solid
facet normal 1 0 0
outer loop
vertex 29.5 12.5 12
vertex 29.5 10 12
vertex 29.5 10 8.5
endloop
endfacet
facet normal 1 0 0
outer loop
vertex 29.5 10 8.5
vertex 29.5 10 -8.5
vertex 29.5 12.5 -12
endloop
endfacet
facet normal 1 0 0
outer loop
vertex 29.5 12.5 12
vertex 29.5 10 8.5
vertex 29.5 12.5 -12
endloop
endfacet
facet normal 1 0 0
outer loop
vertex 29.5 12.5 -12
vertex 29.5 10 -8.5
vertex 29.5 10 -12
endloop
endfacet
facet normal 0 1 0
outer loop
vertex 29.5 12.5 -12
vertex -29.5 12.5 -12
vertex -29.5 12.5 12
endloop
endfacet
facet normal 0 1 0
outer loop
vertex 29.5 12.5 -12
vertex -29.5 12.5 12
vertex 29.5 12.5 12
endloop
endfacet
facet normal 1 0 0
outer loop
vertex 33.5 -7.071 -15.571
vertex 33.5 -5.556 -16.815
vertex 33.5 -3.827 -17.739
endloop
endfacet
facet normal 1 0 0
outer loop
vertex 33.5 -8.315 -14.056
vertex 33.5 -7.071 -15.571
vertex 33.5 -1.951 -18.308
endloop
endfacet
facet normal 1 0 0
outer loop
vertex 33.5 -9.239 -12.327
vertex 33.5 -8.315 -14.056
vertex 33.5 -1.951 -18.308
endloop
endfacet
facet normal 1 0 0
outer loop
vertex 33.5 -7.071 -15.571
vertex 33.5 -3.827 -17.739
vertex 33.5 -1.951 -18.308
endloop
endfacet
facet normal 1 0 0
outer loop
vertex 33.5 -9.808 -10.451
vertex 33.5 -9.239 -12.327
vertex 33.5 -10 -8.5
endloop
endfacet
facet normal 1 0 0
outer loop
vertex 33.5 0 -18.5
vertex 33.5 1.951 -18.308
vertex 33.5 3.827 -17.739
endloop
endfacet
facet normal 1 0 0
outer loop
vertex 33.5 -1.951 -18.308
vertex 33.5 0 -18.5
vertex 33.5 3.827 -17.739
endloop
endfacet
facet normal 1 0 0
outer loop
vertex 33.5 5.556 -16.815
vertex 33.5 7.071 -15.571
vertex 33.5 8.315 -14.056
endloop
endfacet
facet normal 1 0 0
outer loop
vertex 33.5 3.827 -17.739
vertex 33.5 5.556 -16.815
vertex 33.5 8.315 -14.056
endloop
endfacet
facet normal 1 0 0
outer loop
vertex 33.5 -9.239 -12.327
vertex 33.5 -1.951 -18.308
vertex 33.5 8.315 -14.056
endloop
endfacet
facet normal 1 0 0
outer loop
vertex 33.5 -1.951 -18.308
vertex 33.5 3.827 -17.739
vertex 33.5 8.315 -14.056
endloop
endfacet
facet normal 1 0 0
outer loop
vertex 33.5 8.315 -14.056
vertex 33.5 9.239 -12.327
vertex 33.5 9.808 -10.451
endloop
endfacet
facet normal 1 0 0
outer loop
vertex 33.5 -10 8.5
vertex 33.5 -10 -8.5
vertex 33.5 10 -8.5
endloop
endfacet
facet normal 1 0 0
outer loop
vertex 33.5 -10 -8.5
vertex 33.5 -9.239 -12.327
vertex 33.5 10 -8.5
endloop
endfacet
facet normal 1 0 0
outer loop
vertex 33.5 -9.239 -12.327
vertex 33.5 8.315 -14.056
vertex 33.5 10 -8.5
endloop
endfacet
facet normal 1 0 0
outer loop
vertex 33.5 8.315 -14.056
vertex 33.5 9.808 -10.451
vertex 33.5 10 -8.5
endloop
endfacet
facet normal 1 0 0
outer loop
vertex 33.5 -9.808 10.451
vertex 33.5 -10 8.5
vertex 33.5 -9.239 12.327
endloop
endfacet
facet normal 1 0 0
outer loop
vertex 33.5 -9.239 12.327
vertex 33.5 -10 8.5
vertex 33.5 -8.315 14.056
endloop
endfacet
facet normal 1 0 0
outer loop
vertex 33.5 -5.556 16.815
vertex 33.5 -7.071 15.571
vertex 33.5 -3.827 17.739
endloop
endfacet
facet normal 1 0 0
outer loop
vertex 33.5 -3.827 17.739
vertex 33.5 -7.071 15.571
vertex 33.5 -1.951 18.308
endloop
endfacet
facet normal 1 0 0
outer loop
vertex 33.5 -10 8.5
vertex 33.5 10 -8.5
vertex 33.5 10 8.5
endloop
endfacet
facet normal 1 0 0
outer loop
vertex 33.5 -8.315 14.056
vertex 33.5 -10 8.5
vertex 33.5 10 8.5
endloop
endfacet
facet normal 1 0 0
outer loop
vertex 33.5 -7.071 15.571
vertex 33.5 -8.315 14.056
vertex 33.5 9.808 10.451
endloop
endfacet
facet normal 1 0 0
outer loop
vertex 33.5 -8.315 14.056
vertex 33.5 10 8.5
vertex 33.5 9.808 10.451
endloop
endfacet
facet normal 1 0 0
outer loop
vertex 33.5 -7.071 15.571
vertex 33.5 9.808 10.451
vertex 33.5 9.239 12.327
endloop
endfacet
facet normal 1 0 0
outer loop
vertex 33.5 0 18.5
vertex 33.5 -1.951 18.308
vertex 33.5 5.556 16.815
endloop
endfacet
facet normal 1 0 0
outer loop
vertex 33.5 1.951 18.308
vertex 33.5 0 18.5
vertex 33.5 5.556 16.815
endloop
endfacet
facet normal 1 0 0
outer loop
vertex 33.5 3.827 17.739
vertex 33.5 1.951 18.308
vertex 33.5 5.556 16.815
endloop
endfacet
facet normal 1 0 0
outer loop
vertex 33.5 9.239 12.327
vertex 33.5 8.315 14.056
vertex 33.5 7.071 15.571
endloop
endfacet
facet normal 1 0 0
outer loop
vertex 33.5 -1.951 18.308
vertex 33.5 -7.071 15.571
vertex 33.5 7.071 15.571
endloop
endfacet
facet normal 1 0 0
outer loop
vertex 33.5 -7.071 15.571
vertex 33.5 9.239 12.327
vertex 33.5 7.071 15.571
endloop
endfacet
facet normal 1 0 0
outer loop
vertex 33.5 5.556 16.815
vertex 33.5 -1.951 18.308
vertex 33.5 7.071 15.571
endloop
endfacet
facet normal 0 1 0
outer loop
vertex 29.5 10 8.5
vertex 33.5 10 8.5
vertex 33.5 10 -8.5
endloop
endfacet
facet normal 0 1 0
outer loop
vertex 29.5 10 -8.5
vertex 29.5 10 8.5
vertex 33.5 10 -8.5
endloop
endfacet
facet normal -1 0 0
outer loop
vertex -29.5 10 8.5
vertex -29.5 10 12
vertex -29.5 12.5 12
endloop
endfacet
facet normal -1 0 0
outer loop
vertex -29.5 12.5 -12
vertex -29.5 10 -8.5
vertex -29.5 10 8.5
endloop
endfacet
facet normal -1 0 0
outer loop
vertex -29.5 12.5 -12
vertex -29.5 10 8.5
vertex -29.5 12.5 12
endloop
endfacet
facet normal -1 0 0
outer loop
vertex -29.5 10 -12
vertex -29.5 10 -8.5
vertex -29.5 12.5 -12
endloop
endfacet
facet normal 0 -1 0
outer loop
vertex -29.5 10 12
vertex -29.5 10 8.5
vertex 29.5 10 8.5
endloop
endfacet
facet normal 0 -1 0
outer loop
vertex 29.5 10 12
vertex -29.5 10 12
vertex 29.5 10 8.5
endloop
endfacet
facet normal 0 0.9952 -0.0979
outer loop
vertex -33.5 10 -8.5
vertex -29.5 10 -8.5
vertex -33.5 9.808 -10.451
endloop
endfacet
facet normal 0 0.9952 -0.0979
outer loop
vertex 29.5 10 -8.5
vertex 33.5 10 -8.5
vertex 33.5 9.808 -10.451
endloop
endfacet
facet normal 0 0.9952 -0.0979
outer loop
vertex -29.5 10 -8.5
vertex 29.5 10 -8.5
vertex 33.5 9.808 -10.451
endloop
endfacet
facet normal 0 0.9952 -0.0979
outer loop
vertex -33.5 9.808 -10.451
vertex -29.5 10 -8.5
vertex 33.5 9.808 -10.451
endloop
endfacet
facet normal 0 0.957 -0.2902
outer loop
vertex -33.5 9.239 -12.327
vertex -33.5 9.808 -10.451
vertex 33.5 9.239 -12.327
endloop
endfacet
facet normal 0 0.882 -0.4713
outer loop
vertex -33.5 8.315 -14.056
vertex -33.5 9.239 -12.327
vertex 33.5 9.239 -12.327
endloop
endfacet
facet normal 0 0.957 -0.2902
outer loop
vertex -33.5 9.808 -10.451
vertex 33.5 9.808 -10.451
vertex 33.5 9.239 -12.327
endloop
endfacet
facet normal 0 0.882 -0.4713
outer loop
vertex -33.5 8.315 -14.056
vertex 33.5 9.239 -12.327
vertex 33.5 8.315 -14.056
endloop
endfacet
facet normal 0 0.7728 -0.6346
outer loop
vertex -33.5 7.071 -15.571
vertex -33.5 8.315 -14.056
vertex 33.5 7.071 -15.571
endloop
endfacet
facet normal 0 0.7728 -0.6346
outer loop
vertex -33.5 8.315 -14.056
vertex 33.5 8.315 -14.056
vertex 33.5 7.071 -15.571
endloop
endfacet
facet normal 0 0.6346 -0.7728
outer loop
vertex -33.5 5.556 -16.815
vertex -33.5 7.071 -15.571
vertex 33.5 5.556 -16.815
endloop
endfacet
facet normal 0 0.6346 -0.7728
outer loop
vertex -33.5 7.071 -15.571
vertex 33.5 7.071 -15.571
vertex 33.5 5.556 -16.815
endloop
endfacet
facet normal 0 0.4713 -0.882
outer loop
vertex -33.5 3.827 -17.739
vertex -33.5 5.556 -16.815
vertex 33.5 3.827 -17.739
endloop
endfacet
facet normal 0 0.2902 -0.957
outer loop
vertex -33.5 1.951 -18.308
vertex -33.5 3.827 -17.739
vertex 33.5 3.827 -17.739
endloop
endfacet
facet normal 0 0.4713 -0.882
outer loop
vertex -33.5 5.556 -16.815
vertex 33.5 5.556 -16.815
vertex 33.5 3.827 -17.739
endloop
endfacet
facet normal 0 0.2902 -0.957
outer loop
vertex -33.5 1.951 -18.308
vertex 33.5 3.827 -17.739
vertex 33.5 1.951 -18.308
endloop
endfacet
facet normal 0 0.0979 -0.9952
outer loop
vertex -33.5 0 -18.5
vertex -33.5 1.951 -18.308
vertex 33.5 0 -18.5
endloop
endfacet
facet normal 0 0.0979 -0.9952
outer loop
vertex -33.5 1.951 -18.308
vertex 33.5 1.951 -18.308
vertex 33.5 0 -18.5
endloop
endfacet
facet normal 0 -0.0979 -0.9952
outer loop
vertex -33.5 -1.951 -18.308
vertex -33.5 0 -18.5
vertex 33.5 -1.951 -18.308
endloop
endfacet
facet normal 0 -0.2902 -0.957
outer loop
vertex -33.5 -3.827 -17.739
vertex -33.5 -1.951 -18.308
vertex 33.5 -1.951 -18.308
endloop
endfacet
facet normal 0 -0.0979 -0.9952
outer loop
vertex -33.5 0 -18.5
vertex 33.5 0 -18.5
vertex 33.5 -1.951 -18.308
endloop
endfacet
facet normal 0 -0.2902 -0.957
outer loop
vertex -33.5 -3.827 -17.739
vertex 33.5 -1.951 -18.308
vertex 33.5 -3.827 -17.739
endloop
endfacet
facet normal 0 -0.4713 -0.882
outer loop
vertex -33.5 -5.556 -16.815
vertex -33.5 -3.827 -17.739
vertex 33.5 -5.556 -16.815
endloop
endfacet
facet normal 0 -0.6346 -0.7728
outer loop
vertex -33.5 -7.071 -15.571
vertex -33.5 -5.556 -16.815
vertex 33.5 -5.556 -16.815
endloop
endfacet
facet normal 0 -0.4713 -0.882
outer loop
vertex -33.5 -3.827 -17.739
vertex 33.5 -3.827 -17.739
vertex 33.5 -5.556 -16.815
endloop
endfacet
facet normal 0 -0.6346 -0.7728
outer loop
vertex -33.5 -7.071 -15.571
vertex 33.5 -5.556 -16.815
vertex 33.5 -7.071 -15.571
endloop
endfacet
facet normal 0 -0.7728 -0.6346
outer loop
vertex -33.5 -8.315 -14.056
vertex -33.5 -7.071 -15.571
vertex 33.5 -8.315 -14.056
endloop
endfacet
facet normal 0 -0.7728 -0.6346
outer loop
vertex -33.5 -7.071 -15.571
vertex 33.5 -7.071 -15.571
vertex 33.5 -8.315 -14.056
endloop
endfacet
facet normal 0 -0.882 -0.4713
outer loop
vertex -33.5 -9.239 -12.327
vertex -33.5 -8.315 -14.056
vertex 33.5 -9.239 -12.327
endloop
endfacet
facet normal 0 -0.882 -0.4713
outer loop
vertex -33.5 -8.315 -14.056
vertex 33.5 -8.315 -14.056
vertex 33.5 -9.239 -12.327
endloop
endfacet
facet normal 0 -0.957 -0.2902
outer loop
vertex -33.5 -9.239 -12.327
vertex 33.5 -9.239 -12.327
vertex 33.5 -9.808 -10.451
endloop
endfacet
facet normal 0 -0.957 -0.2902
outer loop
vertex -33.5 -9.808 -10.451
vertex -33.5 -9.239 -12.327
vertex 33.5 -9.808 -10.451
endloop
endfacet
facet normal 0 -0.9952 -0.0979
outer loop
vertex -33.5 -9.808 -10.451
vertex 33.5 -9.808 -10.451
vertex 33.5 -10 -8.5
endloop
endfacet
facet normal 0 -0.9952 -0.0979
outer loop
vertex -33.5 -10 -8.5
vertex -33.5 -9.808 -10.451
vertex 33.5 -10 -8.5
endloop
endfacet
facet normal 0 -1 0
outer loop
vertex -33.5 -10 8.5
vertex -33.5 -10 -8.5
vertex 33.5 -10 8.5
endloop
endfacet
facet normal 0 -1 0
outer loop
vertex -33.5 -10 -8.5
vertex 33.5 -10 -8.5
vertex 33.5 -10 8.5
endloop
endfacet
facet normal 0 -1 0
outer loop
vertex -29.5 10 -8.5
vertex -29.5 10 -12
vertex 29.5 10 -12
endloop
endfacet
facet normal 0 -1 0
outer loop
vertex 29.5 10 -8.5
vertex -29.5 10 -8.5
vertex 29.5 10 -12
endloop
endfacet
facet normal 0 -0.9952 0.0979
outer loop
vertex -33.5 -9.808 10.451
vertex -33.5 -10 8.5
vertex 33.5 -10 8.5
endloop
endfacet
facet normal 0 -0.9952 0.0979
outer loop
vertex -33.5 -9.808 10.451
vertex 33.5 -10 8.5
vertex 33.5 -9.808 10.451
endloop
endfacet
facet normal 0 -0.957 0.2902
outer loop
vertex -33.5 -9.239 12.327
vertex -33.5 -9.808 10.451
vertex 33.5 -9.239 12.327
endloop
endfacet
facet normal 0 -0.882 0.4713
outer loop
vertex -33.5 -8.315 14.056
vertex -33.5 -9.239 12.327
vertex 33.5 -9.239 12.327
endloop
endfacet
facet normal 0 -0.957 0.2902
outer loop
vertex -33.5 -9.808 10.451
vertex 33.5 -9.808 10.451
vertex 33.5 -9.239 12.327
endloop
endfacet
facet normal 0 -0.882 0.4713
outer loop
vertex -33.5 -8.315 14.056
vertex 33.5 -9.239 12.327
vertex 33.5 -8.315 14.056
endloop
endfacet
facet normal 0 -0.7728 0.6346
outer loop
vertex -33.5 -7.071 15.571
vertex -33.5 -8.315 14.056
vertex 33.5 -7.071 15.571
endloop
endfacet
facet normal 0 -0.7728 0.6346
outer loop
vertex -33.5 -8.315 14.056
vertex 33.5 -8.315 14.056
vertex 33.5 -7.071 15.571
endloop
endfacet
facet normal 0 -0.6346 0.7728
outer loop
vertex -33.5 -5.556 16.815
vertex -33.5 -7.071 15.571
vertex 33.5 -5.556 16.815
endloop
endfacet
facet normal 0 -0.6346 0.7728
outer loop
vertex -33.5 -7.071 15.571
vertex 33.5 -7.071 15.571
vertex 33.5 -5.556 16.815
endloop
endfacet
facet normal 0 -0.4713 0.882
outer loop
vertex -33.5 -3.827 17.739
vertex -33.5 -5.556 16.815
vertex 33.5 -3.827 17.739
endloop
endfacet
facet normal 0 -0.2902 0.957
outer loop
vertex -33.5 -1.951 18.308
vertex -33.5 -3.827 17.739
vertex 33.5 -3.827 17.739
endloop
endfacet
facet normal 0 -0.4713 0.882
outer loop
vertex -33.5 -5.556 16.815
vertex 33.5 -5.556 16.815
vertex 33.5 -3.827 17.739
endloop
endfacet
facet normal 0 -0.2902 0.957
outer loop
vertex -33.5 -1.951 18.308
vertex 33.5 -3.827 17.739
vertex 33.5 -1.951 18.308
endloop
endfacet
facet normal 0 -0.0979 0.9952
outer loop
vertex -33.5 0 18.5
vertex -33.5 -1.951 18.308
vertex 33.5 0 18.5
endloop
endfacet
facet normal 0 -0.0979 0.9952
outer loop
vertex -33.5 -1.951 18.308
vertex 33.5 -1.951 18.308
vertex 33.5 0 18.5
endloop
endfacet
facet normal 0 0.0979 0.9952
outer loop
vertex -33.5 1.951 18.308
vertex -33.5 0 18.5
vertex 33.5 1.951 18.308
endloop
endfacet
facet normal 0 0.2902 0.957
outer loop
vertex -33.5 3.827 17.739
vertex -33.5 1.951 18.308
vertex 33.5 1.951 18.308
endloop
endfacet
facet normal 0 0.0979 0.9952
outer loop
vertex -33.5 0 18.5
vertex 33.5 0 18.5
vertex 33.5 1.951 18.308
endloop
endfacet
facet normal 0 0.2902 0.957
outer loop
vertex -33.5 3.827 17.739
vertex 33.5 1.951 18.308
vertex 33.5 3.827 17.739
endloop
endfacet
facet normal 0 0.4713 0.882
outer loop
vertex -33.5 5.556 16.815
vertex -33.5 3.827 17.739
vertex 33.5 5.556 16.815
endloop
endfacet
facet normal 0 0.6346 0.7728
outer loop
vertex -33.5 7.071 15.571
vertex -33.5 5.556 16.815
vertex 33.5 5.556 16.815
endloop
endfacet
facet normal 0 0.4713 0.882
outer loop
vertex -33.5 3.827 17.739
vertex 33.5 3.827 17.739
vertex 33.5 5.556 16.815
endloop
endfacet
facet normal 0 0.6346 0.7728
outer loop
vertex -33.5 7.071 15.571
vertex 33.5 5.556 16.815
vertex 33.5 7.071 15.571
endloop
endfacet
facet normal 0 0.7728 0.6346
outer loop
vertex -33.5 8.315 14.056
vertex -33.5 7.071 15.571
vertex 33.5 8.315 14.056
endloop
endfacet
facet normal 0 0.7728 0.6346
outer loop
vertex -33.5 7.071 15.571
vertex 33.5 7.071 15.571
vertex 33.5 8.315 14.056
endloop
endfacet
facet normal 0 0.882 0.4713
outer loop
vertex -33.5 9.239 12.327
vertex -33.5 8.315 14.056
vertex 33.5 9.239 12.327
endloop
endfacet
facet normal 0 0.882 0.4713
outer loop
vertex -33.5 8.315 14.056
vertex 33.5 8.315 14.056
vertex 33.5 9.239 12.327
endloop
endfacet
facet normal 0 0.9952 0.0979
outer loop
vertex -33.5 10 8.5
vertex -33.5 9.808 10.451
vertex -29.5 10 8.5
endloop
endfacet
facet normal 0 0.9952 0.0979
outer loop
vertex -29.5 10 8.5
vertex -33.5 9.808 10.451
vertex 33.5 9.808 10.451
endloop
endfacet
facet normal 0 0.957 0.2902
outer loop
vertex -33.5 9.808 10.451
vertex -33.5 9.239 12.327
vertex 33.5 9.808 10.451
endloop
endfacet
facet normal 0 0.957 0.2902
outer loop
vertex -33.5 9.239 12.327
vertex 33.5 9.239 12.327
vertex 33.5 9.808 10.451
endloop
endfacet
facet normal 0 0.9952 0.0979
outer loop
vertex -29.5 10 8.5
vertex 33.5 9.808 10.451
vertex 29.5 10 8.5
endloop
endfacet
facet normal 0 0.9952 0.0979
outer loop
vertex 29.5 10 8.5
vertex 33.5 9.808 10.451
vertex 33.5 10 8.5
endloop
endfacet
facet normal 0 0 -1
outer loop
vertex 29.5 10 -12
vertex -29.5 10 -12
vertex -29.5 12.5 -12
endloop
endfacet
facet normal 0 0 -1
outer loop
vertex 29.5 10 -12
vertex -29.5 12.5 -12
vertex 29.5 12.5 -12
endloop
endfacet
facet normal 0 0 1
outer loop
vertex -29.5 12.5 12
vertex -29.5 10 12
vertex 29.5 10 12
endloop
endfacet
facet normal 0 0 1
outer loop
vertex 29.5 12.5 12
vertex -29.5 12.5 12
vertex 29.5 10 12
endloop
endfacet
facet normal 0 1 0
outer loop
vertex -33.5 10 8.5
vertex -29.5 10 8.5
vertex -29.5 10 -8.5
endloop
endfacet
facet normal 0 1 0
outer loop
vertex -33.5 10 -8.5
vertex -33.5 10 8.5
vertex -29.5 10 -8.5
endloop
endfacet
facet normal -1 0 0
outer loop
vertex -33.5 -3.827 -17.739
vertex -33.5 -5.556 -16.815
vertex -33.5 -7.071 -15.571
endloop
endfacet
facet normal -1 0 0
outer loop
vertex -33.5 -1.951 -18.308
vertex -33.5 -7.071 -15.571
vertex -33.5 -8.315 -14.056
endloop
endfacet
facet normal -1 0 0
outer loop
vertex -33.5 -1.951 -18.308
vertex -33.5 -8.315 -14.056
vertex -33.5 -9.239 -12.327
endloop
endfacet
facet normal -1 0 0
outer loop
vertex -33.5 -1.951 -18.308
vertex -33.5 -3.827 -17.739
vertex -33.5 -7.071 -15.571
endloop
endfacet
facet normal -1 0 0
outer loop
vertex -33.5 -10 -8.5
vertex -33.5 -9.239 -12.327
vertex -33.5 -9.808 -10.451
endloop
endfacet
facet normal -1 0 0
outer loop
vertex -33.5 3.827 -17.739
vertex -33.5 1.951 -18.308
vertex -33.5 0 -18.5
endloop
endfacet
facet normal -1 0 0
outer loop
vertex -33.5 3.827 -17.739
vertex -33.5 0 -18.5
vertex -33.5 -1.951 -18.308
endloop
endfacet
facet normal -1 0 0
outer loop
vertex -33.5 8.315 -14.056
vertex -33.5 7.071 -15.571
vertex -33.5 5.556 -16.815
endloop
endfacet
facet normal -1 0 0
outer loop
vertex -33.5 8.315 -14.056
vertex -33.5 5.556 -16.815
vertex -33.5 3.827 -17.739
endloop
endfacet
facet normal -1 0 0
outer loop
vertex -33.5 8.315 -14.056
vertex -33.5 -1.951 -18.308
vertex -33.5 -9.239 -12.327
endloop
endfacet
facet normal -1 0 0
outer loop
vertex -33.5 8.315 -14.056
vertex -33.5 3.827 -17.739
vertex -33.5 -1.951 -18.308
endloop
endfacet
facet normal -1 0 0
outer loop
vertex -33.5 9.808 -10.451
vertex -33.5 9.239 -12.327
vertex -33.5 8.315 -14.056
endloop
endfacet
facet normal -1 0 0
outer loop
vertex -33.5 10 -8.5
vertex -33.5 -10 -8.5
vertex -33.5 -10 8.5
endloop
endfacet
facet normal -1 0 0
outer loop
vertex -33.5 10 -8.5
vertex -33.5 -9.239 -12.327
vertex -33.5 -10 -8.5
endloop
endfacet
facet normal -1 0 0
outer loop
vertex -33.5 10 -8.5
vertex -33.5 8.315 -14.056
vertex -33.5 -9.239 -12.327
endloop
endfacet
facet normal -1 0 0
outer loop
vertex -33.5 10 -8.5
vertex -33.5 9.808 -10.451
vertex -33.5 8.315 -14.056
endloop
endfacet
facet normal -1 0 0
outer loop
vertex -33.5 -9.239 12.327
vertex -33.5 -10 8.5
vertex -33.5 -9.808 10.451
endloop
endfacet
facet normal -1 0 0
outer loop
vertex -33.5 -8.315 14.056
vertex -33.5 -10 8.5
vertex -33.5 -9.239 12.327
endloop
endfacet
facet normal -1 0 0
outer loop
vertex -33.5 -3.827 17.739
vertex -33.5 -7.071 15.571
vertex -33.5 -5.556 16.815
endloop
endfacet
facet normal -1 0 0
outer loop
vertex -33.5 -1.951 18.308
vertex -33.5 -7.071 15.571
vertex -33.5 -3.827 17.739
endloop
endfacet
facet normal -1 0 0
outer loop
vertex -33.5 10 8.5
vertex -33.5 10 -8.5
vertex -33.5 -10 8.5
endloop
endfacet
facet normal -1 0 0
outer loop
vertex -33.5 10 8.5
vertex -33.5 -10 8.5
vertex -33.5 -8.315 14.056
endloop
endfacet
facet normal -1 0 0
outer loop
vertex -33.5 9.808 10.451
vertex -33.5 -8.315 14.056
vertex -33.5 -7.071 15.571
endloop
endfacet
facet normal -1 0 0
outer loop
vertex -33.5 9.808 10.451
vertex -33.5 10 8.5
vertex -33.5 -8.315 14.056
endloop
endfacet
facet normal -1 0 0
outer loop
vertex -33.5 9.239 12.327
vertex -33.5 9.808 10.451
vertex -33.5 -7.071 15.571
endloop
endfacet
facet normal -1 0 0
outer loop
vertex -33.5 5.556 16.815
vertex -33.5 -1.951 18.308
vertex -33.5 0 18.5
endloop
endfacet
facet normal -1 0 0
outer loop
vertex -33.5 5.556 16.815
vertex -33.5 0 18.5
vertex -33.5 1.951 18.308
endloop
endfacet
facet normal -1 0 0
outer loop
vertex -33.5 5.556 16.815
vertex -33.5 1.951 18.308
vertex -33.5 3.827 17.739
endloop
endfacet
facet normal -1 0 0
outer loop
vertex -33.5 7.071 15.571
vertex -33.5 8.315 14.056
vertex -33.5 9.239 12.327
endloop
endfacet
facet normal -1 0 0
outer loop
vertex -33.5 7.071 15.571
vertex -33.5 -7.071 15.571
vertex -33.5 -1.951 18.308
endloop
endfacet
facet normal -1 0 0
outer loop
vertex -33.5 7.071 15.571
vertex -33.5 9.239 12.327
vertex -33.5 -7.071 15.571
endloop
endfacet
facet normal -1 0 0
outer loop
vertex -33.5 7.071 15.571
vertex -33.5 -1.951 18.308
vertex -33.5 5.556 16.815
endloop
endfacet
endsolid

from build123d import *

# Parameters (mm, degrees)
EXTRUDE_1_DEPTH = 33.5
SKETCH_2_W      = 59
SKETCH_2_H      = 24
EXTRUDE_2_DEPTH = 2.5


with BuildPart() as part:
    # 草图1 → 凸台-拉伸1 (new, symmetric)
    with BuildSketch(Plane(origin=(0, 0, 0), x_dir=(0, 0, -1), z_dir=(1, 0, 0))):
        with BuildLine():
            Line((-8.5, 10), (8.5, 10))
            ThreePointArc((8.5, 10), (18.5, 0), (8.5, -10))
            Line((8.5, -10), (-8.5, -10))
            ThreePointArc((-8.5, -10), (-18.5, 0), (-8.5, 10))
        make_face()
    extrude(amount=EXTRUDE_1_DEPTH, both=True)

    # 草图2 → 凸台-拉伸2 (add)
    with BuildSketch(Plane(origin=(0, 10, 0), x_dir=(1, 0, 0), z_dir=(0, 1, 0))):
        Rectangle(SKETCH_2_W, SKETCH_2_H)
    extrude(amount=EXTRUDE_2_DEPTH)


solid = part.part
